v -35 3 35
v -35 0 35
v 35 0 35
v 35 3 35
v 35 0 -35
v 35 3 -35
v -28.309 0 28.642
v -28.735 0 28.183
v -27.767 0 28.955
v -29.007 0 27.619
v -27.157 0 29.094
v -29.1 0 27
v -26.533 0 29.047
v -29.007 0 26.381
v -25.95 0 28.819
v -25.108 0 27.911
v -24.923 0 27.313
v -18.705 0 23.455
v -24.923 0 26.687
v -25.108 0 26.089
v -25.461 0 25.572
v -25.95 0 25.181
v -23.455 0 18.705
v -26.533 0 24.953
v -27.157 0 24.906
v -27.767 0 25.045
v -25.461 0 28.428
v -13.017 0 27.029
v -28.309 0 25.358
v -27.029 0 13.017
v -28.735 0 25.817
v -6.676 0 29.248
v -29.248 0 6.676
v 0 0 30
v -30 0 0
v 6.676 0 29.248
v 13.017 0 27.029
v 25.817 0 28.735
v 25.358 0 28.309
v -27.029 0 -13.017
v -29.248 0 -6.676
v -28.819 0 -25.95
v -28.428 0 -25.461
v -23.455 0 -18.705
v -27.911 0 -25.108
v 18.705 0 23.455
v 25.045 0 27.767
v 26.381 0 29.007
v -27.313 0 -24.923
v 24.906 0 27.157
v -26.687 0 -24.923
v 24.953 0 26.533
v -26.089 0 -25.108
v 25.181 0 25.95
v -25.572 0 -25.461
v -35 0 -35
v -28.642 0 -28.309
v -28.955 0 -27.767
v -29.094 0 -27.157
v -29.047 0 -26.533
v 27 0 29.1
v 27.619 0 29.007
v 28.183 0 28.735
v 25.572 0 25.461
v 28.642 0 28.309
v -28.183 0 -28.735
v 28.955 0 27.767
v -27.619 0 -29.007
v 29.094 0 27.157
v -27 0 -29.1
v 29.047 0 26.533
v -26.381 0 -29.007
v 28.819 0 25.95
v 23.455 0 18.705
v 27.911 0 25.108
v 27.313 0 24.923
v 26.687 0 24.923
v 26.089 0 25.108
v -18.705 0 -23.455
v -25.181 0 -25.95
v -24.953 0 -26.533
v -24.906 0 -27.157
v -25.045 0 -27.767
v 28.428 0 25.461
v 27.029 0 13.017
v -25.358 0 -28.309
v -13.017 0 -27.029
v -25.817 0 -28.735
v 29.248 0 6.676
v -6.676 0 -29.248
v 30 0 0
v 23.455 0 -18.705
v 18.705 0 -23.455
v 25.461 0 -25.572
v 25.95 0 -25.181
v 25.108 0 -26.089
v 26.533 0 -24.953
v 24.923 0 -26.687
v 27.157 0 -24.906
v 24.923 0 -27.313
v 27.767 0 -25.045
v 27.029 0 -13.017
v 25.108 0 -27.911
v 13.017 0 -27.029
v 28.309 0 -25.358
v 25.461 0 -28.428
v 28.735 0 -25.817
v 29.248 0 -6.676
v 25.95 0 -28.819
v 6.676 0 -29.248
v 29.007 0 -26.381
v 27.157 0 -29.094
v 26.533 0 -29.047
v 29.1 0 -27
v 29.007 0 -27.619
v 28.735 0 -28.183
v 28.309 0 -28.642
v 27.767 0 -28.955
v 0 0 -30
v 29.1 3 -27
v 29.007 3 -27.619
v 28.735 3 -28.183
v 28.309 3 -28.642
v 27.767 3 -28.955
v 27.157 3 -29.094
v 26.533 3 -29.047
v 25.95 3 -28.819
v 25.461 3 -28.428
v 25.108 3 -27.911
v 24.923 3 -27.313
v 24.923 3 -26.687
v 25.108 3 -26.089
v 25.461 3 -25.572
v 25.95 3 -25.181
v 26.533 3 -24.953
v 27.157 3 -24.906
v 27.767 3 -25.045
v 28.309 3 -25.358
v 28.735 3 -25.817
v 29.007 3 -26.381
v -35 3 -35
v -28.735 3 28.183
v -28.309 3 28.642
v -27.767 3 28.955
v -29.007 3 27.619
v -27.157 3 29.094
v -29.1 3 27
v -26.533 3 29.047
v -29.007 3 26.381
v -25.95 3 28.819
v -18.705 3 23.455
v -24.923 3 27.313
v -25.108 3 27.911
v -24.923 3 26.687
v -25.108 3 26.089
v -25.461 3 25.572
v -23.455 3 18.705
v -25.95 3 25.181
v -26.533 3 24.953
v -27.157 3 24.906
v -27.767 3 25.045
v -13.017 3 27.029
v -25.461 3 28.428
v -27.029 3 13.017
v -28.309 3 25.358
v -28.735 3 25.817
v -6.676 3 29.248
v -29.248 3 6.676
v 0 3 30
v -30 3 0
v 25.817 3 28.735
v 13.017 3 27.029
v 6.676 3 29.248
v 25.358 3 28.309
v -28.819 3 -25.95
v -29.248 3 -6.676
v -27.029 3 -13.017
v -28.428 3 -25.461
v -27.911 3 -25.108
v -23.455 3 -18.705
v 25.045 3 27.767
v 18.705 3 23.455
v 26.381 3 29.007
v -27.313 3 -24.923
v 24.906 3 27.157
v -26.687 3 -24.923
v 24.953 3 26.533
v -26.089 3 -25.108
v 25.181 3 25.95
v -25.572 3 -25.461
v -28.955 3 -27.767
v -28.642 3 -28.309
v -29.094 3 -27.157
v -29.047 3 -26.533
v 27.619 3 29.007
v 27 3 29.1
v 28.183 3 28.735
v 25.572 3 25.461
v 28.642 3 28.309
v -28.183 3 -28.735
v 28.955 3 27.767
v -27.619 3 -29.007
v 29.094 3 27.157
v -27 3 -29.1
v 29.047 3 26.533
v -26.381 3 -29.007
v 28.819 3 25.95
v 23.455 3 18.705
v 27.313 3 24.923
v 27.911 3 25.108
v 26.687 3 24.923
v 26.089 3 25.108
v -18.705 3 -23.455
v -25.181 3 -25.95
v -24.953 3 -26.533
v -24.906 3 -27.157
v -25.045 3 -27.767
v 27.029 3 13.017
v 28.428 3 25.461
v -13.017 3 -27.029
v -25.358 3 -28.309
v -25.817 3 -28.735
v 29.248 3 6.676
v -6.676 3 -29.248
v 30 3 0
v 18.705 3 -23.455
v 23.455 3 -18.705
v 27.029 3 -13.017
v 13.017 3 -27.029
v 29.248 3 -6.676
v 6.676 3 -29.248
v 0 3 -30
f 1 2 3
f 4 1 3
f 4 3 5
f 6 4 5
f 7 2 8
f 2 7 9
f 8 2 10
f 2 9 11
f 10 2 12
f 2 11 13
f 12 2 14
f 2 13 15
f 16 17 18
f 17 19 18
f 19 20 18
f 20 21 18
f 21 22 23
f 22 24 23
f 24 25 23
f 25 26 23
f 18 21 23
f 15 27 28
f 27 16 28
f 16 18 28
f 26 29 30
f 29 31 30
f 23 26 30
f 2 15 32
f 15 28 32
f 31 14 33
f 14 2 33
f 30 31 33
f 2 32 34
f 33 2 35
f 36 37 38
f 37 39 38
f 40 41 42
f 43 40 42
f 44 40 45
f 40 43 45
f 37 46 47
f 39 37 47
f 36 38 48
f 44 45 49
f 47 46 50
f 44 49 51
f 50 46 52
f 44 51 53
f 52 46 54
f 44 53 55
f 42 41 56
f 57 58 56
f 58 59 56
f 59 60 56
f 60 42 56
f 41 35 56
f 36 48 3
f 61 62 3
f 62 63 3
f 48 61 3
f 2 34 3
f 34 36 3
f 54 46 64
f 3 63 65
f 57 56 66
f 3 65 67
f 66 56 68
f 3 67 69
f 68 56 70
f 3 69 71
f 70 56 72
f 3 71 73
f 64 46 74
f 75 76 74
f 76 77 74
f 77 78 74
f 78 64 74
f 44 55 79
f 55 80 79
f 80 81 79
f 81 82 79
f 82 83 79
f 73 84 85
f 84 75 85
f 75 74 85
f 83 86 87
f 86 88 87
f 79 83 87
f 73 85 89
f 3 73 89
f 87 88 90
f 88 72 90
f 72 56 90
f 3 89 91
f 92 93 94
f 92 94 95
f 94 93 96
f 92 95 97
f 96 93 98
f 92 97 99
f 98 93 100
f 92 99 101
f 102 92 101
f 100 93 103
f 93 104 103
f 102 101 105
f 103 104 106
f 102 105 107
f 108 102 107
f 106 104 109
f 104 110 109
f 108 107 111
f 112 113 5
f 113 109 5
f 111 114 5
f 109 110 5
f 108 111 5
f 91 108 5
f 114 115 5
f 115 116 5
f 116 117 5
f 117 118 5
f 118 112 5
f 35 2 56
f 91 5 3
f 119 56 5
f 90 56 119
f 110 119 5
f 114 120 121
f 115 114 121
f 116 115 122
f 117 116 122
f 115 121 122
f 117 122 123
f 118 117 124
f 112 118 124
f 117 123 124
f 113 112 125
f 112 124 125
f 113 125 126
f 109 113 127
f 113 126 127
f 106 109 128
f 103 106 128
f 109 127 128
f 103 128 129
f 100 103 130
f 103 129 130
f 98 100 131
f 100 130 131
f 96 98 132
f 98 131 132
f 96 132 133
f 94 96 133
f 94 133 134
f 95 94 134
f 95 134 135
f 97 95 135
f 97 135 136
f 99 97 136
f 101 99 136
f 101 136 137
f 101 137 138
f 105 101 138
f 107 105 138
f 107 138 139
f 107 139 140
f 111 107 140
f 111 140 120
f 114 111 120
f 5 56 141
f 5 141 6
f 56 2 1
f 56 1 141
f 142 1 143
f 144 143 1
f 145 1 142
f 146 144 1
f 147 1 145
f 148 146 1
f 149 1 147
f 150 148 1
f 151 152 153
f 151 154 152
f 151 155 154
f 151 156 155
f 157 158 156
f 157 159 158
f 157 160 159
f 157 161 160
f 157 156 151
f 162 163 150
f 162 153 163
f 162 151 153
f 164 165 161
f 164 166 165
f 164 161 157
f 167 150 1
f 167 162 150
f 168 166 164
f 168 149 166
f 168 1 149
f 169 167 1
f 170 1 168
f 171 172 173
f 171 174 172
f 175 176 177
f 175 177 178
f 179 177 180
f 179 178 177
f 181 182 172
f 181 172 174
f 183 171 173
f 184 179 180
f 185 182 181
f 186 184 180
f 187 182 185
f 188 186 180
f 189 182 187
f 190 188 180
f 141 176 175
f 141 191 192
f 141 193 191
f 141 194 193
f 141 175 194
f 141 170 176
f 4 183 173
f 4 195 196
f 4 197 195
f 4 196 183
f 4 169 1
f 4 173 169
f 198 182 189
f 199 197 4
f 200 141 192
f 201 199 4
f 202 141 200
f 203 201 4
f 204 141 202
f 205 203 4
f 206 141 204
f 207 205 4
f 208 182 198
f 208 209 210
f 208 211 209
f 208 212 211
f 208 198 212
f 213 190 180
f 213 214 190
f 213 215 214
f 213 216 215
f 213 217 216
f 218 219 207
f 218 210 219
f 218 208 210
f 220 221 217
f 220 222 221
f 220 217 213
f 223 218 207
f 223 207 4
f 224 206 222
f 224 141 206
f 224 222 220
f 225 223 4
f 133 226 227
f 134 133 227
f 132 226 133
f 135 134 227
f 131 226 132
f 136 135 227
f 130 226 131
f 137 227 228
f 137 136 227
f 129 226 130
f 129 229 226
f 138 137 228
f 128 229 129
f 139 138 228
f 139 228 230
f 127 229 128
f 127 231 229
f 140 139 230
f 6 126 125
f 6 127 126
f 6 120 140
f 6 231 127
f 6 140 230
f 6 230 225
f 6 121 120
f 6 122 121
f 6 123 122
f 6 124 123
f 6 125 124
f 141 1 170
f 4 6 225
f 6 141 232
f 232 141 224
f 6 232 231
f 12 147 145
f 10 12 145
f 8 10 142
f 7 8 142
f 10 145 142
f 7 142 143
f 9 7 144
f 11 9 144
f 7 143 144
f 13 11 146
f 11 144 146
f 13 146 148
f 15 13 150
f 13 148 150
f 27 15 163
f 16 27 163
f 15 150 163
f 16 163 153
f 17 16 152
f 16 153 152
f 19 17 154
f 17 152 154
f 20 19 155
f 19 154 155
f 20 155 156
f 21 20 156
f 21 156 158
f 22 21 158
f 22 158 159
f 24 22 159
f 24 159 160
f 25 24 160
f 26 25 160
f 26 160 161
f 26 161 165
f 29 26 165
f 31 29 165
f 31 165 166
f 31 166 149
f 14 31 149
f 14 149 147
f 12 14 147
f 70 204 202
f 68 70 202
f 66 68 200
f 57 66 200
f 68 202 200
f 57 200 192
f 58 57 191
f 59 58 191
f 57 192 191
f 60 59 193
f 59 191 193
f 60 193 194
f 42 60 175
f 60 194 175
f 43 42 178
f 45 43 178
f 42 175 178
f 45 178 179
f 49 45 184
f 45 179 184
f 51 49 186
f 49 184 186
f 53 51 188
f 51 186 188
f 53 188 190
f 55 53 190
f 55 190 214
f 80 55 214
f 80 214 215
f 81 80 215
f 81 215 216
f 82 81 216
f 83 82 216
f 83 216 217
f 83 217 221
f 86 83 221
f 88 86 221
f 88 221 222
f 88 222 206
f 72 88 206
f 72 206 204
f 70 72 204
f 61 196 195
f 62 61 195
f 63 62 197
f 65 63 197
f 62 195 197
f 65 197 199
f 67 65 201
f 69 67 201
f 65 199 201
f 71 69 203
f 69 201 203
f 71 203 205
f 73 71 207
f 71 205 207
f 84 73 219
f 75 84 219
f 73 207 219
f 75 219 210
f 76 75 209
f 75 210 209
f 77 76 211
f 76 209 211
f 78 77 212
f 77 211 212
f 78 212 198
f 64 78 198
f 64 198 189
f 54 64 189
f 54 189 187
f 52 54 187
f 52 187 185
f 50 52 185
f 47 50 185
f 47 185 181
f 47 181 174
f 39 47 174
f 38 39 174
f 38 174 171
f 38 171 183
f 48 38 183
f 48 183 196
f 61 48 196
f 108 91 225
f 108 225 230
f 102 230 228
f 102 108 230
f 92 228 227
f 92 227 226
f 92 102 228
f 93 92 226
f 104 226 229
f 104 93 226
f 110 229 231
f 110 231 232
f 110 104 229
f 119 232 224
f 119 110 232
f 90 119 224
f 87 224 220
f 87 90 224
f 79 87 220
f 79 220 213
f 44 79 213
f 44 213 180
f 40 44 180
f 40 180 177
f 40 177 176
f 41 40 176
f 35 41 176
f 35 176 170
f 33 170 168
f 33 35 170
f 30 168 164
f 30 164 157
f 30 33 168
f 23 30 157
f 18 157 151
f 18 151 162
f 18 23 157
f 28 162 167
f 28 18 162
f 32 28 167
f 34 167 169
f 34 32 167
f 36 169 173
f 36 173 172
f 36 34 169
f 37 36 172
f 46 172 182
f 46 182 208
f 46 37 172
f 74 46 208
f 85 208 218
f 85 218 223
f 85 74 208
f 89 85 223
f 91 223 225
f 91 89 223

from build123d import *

# Parameters (mm, degrees)
SKETCH_1_W               = 70
SKETCH_1_H               = 70
SKETCH_1_R               = 30
EXTRUDE_1_DEPTH          = 3
SKETCH_2_R               = 2.1
CUT_EXTRUDE_1_DEPTH      = 10
PATTERN_CIRCULAR_1_COUNT = 4


with BuildPart() as part:
    # 草图1 → 凸台-拉伸1 (new body)
    with BuildSketch(Plane(origin=(0, 0, 0), x_dir=(1, 0, 0), z_dir=(0, 1, 0))):
        Rectangle(SKETCH_1_W, SKETCH_1_H)
        Circle(SKETCH_1_R, mode=Mode.SUBTRACT)
    extrude(amount=EXTRUDE_1_DEPTH)

    # 草图2 → 切除-拉伸1 (cut)
    with BuildSketch(Plane(origin=(0, 3, 0), x_dir=(1, 0, 0), z_dir=(0, 1, 0))):
        with Locations((27, 27)):
            Circle(SKETCH_2_R)
    cut_extrude_1 = extrude(amount=-CUT_EXTRUDE_1_DEPTH, mode=Mode.SUBTRACT)

    # 阵列(圆周)1: 切除-拉伸1 ×4 about axis
    pattern_circular_1_axis = Axis((0, 0, 0), (0, 1, 0))
    for i in range(1, PATTERN_CIRCULAR_1_COUNT):
        add(cut_extrude_1.rotate(pattern_circular_1_axis, i * 360 / PATTERN_CIRCULAR_1_COUNT), mode=Mode.SUBTRACT)


solid = part.part
